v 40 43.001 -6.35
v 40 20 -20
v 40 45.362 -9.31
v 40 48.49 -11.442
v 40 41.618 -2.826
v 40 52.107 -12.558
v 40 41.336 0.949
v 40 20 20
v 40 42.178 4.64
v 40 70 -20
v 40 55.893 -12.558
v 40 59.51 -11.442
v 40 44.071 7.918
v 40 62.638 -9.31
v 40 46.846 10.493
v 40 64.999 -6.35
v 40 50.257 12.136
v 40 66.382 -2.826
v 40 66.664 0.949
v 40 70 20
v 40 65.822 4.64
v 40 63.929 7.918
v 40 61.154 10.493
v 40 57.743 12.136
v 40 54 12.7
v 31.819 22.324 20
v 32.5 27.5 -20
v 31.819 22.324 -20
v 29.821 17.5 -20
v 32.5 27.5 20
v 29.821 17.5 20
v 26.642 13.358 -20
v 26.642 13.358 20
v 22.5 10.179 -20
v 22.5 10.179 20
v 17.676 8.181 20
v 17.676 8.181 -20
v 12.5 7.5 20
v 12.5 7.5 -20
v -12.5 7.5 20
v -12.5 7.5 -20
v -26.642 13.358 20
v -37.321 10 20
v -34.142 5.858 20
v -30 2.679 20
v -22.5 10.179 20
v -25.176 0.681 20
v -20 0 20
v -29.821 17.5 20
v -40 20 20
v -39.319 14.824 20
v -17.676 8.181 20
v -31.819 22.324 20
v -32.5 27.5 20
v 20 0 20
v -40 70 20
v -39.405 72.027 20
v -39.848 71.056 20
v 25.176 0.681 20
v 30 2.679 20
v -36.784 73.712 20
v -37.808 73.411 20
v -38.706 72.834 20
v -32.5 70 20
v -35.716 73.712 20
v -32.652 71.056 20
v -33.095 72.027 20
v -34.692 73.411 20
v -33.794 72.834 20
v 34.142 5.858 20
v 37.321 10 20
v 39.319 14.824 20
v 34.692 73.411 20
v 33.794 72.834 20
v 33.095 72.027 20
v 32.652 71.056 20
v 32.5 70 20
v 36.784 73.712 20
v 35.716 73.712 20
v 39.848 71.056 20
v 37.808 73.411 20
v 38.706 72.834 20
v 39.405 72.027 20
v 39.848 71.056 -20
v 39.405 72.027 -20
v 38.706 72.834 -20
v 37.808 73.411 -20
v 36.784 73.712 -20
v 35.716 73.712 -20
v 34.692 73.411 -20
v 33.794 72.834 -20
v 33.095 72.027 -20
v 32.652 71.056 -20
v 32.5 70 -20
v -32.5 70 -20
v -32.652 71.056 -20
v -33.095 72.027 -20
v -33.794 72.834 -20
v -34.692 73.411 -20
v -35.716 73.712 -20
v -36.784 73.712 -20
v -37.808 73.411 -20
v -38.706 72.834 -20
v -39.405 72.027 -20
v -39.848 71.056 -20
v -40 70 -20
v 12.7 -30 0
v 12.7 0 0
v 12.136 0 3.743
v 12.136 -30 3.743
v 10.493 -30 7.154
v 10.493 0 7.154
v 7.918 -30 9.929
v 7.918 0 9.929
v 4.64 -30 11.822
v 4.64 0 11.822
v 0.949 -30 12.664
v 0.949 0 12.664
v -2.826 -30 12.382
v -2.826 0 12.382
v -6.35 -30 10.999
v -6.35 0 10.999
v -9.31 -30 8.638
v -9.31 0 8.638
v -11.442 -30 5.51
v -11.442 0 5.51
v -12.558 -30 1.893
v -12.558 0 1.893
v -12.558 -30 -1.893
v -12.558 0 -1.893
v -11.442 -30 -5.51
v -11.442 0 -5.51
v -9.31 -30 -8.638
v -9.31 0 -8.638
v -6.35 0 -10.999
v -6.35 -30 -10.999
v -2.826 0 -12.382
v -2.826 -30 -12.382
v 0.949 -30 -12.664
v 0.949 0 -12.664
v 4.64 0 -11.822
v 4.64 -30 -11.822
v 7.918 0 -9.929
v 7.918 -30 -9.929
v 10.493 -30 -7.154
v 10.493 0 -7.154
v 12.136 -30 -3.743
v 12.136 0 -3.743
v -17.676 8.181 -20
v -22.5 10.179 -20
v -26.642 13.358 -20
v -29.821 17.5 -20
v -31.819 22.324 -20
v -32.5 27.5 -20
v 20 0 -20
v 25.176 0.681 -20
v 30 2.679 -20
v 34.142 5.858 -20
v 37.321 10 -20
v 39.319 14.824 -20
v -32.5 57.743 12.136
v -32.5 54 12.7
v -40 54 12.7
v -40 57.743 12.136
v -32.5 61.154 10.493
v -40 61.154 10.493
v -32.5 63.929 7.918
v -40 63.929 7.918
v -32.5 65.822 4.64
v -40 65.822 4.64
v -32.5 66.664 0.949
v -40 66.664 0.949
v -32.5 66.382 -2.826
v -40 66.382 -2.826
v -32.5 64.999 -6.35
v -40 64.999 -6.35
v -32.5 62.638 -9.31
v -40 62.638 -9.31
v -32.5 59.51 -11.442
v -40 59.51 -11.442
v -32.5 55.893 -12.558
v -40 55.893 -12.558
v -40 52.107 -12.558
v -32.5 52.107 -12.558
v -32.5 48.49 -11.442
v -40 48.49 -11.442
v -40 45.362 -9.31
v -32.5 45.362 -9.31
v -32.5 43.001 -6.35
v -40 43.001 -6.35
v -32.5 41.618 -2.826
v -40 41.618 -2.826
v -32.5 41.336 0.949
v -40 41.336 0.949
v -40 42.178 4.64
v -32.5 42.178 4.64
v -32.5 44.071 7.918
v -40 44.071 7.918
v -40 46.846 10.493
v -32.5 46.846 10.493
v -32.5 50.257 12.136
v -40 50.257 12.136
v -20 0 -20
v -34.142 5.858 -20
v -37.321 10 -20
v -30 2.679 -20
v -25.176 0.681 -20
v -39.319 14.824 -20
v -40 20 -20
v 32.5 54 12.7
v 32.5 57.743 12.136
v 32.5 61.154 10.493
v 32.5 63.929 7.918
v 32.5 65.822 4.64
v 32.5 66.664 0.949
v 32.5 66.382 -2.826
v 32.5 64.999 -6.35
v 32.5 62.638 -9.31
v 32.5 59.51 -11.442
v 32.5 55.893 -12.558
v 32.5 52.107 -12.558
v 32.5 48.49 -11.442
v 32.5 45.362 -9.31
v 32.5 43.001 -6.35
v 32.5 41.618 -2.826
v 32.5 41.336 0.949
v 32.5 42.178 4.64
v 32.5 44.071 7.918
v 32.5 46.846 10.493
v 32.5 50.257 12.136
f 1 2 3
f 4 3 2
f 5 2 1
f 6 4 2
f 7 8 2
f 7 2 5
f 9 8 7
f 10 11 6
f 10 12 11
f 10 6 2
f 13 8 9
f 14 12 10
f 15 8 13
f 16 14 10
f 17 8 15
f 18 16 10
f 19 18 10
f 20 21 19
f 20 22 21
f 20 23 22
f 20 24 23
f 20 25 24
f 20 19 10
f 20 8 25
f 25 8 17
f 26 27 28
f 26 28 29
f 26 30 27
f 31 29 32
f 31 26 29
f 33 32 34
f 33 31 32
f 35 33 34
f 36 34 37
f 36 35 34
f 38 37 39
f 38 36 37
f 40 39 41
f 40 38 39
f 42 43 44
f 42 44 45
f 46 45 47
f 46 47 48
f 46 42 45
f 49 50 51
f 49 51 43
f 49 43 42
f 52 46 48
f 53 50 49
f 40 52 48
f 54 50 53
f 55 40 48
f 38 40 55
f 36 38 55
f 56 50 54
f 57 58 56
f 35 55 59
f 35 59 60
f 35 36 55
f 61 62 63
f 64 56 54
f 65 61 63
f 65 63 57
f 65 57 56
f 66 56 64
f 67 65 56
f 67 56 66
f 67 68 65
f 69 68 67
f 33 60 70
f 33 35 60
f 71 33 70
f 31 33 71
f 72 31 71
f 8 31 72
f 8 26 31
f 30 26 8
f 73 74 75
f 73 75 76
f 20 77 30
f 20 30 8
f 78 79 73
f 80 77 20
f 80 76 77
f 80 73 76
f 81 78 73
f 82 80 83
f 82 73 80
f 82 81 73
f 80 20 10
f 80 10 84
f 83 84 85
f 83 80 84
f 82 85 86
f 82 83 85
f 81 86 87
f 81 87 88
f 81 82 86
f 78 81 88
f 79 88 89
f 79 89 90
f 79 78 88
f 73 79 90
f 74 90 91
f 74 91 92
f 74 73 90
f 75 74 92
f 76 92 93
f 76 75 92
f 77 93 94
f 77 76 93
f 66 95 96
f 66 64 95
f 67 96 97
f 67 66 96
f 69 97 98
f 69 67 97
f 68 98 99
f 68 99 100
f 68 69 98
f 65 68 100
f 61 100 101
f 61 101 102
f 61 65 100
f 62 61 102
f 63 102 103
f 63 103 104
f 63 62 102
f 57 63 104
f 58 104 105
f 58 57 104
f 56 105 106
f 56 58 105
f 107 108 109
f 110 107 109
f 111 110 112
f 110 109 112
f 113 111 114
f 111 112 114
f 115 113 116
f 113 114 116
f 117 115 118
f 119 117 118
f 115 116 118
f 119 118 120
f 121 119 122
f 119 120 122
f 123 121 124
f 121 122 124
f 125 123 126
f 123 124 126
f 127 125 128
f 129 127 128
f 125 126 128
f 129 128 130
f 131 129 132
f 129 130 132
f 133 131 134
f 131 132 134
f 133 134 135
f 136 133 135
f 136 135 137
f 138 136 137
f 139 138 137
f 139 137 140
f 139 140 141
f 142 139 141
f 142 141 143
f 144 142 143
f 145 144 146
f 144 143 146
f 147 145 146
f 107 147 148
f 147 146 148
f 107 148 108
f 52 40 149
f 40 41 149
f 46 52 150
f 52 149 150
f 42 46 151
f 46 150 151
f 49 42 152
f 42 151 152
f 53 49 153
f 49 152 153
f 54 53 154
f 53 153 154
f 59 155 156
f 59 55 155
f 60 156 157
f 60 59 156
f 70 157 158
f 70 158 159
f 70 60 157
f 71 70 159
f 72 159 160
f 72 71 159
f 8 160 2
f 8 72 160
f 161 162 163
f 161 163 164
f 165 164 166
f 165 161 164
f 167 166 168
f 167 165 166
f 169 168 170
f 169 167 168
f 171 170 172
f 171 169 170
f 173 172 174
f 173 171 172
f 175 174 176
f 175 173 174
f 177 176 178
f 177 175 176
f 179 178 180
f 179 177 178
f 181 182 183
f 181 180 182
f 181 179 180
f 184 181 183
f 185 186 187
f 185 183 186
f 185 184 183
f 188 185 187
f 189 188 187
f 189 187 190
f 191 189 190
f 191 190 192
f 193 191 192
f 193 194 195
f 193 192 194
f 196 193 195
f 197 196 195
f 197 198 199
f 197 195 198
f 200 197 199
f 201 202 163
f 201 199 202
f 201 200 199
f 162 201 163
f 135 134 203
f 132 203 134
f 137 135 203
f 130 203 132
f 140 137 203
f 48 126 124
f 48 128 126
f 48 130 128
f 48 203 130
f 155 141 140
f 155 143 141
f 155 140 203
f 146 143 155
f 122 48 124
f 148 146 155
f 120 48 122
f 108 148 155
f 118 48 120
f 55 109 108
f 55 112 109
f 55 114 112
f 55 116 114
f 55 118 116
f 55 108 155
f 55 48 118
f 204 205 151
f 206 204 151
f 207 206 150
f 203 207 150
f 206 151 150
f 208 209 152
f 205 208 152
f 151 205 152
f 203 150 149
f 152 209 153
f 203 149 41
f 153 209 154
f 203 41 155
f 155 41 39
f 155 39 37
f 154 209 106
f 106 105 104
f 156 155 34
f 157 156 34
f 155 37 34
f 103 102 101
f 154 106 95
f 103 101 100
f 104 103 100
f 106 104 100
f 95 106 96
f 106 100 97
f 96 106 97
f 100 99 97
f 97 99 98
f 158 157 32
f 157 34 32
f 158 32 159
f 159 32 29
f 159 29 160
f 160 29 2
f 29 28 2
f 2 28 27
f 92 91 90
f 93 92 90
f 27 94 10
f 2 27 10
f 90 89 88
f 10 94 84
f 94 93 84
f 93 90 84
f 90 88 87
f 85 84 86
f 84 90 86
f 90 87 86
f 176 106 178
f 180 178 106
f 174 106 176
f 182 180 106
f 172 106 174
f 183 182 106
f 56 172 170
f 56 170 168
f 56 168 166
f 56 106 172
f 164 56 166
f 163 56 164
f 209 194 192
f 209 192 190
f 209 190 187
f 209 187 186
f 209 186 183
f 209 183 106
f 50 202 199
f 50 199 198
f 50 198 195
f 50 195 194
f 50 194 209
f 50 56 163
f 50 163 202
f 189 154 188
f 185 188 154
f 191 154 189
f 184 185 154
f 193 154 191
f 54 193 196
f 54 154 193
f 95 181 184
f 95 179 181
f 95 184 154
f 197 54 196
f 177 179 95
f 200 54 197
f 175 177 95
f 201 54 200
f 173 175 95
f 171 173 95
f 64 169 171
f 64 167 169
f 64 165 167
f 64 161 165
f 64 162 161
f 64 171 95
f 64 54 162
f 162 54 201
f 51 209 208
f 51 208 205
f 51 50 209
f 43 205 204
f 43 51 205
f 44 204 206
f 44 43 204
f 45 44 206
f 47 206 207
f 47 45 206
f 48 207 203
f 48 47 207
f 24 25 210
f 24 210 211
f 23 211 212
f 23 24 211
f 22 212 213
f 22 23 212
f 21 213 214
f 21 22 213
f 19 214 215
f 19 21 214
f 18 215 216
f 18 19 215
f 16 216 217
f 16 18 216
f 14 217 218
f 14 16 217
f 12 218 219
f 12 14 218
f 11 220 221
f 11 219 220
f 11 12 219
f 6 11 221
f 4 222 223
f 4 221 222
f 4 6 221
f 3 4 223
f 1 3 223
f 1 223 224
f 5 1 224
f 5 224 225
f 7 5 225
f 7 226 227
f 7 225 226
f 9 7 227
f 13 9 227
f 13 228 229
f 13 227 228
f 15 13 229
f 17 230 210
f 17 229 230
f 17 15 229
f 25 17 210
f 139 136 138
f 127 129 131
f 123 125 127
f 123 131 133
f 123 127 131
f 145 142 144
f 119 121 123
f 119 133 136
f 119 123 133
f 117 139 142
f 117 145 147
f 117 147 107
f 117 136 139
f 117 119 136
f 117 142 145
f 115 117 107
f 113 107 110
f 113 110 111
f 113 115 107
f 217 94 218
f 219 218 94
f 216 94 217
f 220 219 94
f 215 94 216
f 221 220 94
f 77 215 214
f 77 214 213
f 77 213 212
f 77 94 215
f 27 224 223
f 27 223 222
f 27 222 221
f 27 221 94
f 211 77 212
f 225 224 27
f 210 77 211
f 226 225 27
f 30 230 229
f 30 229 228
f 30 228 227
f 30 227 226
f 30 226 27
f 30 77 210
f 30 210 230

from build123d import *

# Parameters (mm, degrees)
BOSS_EXTRUDE1_DEPTH     = 20
SKETCH2_R               = 12.7
BOSS_EXTRUDE2_DEPTH     = 30
FILLET1_R               = 20
CUT_EXTRUDE1_DEPTH      = 111.630296483
CUT_EXTRUDE1_DEPTH_BACK = 111.630296483
SKETCH3_R               = 12.7


with BuildPart() as part:
    # Sketch1 → Boss-Extrude1 (new, symmetric)
    with BuildSketch(Plane.XY):
        with BuildLine():
            Line((-40, 70), (-40, 0))
            Line((-40, 0), (40, 0))
            Line((40, 0), (40, 70))
            ThreePointArc((40, 70), (36.25, 73.75), (32.5, 70))
            Line((32.5, 70), (32.5, 7.5))
            Line((32.5, 7.5), (-32.5, 7.5))
            Line((-32.5, 7.5), (-32.5, 70))
            ThreePointArc((-32.5, 70), (-36.25, 73.75), (-40, 70))
        make_face()
    extrude(amount=BOSS_EXTRUDE1_DEPTH, both=True)

    # Sketch2 → Boss-Extrude2 (add)
    with BuildSketch(Plane(origin=(0, 0, 0), x_dir=(-1, 0, 0), z_dir=(0, -1, 0))):
        with Locations(Location((0, 0, 0), (0, 0, 180))):
            Circle(SKETCH2_R)
    extrude(amount=BOSS_EXTRUDE2_DEPTH)

    # Fillet1
    fillet1_edges = [part.edges().sort_by_distance(p)[0] for p in [
        (-32.5, 7.5, 0),
        (32.5, 7.5, 0),
        (40, 0, 0),
        (-40, 0, 0),
    ]]
    fillet(fillet1_edges, radius=FILLET1_R)

    # Sketch3 → Cut-Extrude1 (cut, two sides: drawn at the far end of the back side and taken through both)
    with BuildSketch(Plane.ZY.offset(40).offset(-CUT_EXTRUDE1_DEPTH_BACK)):
        with Locations((0, 54)):
            Circle(SKETCH3_R)
    extrude(amount=CUT_EXTRUDE1_DEPTH + CUT_EXTRUDE1_DEPTH_BACK, mode=Mode.SUBTRACT)


solid = part.part
